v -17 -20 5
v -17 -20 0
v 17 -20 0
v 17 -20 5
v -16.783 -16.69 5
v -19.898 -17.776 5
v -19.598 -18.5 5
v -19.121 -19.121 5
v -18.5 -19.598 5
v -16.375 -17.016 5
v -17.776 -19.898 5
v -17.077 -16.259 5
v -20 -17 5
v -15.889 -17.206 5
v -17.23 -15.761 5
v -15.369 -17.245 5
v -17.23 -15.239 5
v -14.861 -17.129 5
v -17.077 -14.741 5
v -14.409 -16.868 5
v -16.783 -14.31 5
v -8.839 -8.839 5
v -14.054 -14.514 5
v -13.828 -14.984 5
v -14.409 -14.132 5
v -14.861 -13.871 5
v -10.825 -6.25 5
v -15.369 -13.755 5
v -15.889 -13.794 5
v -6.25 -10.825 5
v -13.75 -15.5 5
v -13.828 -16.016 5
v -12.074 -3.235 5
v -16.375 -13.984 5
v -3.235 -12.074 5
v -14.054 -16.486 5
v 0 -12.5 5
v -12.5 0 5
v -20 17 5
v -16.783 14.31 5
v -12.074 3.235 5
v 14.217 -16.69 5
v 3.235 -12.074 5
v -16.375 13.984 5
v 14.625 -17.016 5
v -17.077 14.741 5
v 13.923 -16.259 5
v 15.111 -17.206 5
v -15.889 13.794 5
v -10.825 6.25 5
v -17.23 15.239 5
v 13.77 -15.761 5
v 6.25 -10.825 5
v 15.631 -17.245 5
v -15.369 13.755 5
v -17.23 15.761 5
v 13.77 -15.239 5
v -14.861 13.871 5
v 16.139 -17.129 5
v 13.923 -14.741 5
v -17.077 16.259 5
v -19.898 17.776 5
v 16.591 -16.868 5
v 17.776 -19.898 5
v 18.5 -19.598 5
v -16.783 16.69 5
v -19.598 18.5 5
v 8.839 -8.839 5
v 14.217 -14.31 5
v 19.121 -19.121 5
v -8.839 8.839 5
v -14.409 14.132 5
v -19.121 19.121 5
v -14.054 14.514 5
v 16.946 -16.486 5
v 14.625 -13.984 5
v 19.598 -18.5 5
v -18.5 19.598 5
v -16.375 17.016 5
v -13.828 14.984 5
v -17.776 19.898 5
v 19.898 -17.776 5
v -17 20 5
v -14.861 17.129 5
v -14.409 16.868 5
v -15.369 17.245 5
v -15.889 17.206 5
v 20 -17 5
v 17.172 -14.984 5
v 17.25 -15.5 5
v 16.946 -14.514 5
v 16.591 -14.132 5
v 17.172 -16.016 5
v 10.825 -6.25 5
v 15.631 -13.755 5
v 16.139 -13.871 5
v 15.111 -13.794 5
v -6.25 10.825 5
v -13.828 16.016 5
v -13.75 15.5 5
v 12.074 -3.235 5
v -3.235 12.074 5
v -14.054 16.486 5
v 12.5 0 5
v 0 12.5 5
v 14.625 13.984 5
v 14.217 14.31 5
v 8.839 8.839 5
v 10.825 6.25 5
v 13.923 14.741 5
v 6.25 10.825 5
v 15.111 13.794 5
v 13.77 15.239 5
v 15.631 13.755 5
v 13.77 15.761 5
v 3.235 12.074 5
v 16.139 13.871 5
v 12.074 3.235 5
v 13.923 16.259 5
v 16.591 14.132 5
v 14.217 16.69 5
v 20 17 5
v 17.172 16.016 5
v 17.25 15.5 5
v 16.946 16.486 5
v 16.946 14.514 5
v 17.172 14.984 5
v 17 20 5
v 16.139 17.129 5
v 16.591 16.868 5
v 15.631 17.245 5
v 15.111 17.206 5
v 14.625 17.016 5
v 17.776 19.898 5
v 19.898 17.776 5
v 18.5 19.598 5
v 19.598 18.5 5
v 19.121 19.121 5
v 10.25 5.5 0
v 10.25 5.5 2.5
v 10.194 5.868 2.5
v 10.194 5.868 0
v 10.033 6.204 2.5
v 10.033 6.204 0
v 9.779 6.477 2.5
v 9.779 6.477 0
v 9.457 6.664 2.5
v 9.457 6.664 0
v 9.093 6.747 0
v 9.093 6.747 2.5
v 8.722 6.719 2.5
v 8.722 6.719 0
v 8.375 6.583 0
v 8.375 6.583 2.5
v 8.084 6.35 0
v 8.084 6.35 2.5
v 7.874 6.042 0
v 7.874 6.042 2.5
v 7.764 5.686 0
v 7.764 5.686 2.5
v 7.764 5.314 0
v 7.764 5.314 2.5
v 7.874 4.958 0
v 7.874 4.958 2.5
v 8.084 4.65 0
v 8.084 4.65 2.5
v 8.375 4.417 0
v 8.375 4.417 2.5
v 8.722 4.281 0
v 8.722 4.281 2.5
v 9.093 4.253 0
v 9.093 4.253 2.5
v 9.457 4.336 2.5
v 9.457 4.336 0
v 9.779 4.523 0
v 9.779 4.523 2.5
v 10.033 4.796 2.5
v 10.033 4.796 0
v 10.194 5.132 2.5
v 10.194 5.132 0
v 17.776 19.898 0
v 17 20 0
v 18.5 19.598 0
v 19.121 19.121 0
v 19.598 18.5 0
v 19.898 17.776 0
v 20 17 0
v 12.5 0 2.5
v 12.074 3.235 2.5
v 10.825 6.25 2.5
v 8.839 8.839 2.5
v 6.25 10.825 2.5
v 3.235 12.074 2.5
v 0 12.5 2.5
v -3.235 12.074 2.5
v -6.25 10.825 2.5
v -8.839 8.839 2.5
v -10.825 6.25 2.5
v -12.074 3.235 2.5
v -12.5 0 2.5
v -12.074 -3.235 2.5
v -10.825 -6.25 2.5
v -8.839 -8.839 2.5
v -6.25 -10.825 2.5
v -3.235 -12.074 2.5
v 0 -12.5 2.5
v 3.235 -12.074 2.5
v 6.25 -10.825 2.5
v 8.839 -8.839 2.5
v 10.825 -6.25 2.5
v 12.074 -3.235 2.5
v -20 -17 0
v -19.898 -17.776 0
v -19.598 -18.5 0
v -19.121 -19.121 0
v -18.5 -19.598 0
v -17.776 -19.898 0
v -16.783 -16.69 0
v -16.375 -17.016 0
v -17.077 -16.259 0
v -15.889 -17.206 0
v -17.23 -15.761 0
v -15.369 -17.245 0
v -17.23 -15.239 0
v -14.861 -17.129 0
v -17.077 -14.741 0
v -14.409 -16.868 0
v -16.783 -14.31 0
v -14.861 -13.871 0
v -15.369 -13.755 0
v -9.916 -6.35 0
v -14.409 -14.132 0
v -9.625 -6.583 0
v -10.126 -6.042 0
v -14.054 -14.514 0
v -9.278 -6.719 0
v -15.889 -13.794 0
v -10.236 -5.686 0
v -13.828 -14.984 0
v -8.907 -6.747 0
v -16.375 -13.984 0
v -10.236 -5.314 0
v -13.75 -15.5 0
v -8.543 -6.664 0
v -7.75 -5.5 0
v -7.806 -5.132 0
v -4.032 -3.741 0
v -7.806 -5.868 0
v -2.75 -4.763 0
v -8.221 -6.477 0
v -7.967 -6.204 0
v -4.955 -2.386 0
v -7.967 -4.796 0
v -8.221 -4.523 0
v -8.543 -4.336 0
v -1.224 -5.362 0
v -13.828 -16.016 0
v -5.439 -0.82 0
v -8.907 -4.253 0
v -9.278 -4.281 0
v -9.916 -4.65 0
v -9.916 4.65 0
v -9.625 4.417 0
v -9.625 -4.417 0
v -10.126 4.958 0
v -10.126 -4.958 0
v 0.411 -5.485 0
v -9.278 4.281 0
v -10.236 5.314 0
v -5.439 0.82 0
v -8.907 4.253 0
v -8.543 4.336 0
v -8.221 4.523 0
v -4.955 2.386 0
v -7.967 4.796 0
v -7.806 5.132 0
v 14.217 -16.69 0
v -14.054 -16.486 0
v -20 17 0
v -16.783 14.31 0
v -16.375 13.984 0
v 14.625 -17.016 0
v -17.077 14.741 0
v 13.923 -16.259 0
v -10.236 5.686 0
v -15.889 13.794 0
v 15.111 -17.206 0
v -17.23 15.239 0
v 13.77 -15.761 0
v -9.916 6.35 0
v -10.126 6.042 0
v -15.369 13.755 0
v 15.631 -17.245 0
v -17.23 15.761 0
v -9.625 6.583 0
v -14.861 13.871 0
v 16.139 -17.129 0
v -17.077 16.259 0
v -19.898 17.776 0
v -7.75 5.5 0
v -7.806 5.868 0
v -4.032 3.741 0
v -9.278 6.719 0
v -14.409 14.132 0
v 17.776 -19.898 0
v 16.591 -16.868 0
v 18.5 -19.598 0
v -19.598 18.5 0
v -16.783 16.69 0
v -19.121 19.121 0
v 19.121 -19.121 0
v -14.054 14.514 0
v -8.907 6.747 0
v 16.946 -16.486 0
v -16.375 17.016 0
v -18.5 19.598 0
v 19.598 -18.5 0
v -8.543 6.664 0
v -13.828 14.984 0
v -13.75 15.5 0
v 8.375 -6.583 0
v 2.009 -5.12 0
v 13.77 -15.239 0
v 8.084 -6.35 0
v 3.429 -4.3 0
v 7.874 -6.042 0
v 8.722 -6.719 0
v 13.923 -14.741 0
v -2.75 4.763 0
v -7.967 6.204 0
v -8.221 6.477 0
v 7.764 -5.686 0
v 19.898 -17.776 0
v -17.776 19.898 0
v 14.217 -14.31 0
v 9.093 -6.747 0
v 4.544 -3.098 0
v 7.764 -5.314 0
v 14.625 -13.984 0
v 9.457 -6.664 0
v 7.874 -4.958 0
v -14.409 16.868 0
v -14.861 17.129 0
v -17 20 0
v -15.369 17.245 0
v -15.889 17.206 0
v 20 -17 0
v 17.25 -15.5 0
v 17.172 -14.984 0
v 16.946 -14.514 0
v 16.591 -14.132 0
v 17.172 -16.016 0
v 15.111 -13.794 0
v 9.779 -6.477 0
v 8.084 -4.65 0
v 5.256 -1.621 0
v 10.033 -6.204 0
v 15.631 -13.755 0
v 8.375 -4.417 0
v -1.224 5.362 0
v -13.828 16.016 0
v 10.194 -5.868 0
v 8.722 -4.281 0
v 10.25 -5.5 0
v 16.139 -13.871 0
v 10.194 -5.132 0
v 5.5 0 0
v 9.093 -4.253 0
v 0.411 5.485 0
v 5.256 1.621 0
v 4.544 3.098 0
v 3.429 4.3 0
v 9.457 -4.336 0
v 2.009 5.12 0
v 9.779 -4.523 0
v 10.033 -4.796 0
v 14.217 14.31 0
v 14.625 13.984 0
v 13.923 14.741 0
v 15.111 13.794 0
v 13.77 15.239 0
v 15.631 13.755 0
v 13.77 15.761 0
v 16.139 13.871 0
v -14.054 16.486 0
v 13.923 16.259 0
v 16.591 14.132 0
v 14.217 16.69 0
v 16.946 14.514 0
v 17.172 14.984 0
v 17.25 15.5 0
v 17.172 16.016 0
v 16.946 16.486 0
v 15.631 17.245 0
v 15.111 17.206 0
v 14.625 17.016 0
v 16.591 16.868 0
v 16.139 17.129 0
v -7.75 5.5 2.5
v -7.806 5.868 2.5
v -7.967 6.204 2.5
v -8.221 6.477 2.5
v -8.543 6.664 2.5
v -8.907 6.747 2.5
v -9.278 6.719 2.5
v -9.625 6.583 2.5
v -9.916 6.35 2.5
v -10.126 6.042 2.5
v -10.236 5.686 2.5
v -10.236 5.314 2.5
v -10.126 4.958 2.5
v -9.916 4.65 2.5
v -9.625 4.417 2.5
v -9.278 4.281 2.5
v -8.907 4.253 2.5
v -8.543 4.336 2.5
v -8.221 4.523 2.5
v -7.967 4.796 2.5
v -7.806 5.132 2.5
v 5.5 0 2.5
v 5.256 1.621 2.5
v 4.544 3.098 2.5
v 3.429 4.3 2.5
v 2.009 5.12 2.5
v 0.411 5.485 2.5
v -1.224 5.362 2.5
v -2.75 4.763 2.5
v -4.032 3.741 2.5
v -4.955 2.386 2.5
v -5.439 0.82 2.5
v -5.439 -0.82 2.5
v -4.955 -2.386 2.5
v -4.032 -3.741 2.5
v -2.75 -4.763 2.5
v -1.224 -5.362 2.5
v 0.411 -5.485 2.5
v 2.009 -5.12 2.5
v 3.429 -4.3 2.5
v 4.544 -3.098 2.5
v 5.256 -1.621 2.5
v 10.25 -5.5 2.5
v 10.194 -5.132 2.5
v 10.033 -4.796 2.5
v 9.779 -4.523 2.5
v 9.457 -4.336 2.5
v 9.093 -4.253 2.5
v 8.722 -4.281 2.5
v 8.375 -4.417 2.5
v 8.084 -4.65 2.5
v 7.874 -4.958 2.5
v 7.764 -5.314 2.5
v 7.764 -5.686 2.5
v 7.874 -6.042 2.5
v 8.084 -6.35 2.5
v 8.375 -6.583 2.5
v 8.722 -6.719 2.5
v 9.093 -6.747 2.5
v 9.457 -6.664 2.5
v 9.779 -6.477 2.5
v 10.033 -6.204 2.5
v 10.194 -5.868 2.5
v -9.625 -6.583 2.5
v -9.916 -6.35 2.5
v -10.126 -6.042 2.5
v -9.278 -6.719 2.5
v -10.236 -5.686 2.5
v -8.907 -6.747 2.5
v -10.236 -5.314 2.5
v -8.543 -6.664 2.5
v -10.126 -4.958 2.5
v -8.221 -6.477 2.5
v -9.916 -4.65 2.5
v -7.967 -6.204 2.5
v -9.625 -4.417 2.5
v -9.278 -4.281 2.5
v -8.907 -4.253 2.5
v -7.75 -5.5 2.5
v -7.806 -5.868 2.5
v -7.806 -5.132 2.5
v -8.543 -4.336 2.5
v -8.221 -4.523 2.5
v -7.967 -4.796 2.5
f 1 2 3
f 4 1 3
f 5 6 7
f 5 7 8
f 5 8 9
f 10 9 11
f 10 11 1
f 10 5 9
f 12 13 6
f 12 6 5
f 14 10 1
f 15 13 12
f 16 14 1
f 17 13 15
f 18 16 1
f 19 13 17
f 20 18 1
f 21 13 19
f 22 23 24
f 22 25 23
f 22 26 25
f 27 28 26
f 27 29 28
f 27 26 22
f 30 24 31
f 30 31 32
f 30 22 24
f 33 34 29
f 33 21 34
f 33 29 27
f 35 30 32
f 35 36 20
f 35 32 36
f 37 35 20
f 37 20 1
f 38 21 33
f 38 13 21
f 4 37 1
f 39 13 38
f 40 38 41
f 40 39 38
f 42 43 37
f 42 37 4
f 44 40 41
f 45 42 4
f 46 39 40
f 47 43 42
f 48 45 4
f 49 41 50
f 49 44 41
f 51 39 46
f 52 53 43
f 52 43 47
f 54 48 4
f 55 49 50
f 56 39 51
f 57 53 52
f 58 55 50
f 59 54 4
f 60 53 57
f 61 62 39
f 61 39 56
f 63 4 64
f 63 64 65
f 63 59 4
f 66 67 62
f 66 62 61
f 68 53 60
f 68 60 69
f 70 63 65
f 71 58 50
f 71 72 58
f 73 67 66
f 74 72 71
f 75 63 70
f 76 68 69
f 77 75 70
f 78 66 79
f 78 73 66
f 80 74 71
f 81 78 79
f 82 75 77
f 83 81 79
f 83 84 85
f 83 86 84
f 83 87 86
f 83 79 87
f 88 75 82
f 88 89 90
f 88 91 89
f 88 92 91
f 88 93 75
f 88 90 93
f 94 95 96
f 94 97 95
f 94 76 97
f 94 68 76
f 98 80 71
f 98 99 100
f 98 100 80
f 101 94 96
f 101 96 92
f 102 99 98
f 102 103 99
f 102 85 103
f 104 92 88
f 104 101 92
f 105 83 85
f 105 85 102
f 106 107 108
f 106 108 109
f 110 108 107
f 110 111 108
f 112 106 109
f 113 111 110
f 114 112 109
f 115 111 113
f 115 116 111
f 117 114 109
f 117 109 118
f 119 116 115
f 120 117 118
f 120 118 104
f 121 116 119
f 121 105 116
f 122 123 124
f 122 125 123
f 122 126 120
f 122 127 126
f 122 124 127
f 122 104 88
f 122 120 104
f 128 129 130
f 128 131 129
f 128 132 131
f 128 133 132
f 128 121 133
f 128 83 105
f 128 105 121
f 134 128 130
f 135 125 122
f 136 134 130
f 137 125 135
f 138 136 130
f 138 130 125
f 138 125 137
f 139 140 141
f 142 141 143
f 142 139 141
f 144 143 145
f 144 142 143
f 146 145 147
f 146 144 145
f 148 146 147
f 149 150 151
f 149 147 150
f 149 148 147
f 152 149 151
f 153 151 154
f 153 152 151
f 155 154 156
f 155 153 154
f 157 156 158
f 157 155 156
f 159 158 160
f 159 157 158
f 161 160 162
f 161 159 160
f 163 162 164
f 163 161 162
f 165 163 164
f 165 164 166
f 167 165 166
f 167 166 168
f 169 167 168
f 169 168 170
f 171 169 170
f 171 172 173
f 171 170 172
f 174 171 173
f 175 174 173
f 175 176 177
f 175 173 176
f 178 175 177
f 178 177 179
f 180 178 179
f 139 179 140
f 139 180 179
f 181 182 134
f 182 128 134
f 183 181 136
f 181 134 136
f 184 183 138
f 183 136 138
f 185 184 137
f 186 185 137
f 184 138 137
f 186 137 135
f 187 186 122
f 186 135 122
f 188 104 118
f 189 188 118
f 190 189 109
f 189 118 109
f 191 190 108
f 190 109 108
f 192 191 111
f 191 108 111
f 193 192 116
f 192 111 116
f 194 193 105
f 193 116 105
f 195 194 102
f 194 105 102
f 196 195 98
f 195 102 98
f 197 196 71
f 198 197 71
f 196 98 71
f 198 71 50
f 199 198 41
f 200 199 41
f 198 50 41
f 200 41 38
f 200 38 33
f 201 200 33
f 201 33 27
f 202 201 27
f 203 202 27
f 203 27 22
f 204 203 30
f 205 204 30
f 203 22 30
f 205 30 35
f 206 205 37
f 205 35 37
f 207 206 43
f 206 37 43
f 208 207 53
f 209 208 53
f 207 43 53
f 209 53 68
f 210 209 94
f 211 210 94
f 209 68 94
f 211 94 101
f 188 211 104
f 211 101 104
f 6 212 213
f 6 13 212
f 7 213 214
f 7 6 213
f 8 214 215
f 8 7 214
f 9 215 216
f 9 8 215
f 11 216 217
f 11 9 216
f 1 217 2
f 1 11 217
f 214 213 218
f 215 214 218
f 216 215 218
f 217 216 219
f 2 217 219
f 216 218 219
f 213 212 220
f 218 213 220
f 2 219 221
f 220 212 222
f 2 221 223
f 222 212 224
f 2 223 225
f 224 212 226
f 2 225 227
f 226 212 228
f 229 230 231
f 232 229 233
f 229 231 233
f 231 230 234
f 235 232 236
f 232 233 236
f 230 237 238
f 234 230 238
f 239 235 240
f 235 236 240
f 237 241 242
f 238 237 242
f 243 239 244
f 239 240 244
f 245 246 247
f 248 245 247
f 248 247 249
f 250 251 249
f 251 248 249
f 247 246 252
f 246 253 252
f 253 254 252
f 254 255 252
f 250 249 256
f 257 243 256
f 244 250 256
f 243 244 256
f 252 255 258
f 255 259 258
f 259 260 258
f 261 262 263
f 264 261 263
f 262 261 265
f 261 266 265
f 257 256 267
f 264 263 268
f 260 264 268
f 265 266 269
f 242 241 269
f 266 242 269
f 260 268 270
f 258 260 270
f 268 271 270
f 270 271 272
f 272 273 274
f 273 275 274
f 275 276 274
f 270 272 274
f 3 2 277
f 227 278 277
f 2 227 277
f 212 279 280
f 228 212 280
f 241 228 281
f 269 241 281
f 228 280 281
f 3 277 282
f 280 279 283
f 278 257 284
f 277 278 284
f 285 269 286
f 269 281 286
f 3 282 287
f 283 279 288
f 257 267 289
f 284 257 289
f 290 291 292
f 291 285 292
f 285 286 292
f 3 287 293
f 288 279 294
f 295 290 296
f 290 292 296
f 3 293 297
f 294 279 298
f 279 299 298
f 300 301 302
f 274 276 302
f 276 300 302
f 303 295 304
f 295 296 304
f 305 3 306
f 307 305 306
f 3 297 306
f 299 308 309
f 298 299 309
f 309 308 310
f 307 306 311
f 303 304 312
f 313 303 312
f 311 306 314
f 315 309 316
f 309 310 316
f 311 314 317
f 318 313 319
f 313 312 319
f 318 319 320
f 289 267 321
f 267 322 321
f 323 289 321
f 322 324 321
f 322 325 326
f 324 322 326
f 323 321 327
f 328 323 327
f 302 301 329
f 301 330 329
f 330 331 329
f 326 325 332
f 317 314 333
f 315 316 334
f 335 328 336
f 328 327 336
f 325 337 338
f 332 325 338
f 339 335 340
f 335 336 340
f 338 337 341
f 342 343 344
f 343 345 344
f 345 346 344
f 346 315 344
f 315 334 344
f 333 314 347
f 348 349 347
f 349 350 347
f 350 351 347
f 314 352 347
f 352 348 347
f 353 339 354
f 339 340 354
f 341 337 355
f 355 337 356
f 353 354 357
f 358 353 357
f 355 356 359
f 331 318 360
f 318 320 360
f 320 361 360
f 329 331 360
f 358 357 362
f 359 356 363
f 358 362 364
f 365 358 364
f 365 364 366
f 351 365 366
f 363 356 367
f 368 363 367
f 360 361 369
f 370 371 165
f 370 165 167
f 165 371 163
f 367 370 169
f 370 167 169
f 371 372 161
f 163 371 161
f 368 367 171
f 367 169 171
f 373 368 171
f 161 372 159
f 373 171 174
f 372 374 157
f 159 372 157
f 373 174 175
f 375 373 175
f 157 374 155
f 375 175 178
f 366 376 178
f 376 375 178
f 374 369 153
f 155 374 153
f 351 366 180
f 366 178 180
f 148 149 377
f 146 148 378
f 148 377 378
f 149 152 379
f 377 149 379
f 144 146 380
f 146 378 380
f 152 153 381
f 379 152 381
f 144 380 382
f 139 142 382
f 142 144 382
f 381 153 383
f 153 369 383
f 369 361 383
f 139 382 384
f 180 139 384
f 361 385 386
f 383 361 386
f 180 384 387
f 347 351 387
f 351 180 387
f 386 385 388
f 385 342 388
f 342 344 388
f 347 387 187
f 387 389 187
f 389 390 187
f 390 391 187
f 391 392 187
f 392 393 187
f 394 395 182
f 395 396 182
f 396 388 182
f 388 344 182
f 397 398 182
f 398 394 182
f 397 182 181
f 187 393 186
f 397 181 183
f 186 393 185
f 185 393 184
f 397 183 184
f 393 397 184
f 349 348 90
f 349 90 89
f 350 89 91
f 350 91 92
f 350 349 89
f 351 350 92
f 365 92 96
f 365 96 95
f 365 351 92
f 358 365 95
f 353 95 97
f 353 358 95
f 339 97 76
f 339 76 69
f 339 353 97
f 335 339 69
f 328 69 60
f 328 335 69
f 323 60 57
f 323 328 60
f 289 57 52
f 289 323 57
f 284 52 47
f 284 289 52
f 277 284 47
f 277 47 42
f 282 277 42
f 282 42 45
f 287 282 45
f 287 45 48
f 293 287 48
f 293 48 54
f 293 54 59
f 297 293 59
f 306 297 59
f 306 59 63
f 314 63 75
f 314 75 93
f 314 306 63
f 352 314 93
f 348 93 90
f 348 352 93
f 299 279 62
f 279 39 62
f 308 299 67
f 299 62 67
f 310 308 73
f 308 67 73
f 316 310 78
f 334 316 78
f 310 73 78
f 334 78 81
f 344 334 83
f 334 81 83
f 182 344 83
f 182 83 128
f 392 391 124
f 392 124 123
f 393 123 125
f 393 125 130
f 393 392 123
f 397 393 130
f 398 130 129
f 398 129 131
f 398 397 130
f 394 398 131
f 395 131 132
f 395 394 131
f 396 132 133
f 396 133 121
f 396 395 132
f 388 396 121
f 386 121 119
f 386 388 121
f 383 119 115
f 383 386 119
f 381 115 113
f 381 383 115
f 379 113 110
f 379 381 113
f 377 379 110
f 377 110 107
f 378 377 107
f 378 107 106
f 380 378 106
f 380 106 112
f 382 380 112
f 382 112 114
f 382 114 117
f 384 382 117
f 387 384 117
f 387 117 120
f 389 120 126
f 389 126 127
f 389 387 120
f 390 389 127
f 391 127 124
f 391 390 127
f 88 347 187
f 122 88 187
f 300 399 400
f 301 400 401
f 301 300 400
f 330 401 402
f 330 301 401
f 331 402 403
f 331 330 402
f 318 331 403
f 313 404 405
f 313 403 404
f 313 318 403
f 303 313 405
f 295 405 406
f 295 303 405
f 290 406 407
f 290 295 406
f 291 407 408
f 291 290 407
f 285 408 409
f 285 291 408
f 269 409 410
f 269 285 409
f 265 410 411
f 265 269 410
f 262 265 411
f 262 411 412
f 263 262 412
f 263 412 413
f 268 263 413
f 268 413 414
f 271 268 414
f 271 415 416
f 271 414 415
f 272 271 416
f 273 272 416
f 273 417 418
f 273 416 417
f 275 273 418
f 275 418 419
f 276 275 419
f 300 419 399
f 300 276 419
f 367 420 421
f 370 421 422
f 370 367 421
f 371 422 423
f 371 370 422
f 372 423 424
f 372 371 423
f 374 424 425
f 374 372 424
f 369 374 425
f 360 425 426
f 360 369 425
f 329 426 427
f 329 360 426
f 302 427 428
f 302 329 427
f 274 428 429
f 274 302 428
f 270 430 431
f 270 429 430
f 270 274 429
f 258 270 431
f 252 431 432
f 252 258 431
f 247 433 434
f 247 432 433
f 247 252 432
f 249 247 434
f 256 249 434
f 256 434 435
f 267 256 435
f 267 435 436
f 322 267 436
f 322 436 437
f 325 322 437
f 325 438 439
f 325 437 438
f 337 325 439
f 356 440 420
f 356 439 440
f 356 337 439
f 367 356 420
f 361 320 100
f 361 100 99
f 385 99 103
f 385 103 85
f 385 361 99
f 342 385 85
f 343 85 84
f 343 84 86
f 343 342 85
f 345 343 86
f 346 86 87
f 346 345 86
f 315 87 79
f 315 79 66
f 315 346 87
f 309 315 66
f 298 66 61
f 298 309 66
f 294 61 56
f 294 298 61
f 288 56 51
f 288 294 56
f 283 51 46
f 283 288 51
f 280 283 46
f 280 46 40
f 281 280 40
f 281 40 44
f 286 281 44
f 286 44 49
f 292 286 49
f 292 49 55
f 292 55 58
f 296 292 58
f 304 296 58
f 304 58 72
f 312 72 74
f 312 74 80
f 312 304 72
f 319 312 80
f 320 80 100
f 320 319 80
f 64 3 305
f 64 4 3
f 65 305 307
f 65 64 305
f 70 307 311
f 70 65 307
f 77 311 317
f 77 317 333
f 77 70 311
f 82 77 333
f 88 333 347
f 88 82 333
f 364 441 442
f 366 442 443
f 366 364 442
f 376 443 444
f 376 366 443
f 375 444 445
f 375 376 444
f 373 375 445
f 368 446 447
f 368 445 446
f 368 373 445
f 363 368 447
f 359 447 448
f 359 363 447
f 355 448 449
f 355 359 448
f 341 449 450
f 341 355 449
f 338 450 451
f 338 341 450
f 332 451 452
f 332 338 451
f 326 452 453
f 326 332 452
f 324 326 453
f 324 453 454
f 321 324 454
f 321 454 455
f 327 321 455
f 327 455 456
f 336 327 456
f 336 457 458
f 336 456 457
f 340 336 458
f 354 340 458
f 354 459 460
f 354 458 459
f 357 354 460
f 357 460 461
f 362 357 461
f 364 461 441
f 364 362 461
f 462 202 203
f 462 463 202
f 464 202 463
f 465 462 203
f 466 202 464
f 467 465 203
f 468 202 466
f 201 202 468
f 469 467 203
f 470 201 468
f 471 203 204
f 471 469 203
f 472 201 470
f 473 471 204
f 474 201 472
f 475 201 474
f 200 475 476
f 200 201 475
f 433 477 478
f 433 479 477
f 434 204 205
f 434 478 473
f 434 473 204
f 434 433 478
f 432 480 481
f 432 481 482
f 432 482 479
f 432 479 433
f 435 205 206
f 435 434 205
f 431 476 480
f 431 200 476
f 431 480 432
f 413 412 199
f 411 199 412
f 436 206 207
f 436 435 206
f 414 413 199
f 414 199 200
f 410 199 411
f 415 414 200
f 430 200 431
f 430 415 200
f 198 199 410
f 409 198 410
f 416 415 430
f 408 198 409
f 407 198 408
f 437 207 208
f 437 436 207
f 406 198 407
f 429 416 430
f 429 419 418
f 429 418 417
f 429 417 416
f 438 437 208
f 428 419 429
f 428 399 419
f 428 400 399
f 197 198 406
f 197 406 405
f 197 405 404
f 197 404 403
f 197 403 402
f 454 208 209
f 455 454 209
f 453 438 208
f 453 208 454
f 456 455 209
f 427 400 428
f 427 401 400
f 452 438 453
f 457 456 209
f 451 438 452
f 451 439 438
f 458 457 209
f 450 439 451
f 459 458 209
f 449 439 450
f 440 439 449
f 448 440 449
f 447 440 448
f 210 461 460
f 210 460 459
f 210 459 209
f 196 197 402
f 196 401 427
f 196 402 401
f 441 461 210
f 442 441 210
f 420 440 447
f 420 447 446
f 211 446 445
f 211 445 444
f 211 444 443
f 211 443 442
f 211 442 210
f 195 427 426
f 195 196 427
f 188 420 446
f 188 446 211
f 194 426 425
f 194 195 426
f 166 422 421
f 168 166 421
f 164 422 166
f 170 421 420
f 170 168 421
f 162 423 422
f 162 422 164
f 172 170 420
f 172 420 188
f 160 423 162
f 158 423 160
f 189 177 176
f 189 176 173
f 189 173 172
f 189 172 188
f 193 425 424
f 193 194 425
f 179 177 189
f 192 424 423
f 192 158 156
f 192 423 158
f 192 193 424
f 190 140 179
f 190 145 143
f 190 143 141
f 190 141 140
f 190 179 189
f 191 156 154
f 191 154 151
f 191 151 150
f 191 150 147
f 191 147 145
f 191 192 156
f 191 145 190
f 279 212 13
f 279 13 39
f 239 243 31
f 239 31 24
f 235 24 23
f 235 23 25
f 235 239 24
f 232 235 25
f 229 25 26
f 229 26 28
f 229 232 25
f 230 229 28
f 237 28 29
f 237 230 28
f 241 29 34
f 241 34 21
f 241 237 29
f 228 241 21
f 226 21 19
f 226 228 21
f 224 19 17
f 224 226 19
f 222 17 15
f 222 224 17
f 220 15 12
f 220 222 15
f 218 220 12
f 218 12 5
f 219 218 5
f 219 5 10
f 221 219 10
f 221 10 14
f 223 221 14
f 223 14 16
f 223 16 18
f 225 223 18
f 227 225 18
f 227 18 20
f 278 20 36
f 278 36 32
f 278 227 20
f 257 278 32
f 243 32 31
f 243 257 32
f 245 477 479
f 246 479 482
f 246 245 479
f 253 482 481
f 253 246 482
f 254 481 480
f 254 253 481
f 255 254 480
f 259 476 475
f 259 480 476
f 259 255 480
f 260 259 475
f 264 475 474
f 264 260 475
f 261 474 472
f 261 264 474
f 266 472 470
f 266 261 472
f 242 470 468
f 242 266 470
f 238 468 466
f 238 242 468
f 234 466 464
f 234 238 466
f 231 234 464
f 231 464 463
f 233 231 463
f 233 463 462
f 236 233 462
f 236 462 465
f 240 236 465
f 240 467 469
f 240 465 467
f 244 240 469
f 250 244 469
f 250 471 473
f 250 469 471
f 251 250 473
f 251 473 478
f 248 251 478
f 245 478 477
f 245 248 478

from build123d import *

# Parameters (mm, degrees)
F0_W     = 40
F0_H     = 40
F0_R     = 1.75
F0_R_2   = 1.25
F0_R_3   = 5.5
F1_DEPTH = 5
F2_R     = 12.5
F3_DEPTH = 2.5
F4_R     = 3


with BuildPart() as f1:
    # F0 (on Top) → F1 (new body)
    with BuildSketch(Plane.XY):
        Rectangle(F0_W, F0_H)
        with Locations((-15.5, -15.5)):
            Circle(F0_R, mode=Mode.SUBTRACT)
        with Locations((-9, -5.5)):
            Circle(F0_R_2, mode=Mode.SUBTRACT)
        with Locations((15.5, -15.5)):
            Circle(F0_R, mode=Mode.SUBTRACT)
        with Locations((9, -5.5)):
            Circle(F0_R_2, mode=Mode.SUBTRACT)
        with Locations((-9, 5.5)):
            Circle(F0_R_2, mode=Mode.SUBTRACT)
        with Locations((-15.5, 15.5)):
            Circle(F0_R, mode=Mode.SUBTRACT)
        Circle(F0_R_3, mode=Mode.SUBTRACT)
        with Locations((9, 5.5)):
            Circle(F0_R_2, mode=Mode.SUBTRACT)
        with Locations((15.5, 15.5)):
            Circle(F0_R, mode=Mode.SUBTRACT)
    extrude(amount=F1_DEPTH)

    # F2 (on face) → F3 (cut)
    with BuildSketch(Plane.XY.offset(5)):
        Circle(F2_R)
    extrude(amount=-F3_DEPTH, mode=Mode.SUBTRACT)

    # F4
    f4_edges = [f1.edges().sort_by_distance(p)[0] for p in [
        (-20, -20, 2.5),
        (20, -20, 2.5),
        (20, 20, 2.5),
        (-20, 20, 2.5),
    ]]
    fillet(f4_edges, radius=F4_R)


solid = f1.part
